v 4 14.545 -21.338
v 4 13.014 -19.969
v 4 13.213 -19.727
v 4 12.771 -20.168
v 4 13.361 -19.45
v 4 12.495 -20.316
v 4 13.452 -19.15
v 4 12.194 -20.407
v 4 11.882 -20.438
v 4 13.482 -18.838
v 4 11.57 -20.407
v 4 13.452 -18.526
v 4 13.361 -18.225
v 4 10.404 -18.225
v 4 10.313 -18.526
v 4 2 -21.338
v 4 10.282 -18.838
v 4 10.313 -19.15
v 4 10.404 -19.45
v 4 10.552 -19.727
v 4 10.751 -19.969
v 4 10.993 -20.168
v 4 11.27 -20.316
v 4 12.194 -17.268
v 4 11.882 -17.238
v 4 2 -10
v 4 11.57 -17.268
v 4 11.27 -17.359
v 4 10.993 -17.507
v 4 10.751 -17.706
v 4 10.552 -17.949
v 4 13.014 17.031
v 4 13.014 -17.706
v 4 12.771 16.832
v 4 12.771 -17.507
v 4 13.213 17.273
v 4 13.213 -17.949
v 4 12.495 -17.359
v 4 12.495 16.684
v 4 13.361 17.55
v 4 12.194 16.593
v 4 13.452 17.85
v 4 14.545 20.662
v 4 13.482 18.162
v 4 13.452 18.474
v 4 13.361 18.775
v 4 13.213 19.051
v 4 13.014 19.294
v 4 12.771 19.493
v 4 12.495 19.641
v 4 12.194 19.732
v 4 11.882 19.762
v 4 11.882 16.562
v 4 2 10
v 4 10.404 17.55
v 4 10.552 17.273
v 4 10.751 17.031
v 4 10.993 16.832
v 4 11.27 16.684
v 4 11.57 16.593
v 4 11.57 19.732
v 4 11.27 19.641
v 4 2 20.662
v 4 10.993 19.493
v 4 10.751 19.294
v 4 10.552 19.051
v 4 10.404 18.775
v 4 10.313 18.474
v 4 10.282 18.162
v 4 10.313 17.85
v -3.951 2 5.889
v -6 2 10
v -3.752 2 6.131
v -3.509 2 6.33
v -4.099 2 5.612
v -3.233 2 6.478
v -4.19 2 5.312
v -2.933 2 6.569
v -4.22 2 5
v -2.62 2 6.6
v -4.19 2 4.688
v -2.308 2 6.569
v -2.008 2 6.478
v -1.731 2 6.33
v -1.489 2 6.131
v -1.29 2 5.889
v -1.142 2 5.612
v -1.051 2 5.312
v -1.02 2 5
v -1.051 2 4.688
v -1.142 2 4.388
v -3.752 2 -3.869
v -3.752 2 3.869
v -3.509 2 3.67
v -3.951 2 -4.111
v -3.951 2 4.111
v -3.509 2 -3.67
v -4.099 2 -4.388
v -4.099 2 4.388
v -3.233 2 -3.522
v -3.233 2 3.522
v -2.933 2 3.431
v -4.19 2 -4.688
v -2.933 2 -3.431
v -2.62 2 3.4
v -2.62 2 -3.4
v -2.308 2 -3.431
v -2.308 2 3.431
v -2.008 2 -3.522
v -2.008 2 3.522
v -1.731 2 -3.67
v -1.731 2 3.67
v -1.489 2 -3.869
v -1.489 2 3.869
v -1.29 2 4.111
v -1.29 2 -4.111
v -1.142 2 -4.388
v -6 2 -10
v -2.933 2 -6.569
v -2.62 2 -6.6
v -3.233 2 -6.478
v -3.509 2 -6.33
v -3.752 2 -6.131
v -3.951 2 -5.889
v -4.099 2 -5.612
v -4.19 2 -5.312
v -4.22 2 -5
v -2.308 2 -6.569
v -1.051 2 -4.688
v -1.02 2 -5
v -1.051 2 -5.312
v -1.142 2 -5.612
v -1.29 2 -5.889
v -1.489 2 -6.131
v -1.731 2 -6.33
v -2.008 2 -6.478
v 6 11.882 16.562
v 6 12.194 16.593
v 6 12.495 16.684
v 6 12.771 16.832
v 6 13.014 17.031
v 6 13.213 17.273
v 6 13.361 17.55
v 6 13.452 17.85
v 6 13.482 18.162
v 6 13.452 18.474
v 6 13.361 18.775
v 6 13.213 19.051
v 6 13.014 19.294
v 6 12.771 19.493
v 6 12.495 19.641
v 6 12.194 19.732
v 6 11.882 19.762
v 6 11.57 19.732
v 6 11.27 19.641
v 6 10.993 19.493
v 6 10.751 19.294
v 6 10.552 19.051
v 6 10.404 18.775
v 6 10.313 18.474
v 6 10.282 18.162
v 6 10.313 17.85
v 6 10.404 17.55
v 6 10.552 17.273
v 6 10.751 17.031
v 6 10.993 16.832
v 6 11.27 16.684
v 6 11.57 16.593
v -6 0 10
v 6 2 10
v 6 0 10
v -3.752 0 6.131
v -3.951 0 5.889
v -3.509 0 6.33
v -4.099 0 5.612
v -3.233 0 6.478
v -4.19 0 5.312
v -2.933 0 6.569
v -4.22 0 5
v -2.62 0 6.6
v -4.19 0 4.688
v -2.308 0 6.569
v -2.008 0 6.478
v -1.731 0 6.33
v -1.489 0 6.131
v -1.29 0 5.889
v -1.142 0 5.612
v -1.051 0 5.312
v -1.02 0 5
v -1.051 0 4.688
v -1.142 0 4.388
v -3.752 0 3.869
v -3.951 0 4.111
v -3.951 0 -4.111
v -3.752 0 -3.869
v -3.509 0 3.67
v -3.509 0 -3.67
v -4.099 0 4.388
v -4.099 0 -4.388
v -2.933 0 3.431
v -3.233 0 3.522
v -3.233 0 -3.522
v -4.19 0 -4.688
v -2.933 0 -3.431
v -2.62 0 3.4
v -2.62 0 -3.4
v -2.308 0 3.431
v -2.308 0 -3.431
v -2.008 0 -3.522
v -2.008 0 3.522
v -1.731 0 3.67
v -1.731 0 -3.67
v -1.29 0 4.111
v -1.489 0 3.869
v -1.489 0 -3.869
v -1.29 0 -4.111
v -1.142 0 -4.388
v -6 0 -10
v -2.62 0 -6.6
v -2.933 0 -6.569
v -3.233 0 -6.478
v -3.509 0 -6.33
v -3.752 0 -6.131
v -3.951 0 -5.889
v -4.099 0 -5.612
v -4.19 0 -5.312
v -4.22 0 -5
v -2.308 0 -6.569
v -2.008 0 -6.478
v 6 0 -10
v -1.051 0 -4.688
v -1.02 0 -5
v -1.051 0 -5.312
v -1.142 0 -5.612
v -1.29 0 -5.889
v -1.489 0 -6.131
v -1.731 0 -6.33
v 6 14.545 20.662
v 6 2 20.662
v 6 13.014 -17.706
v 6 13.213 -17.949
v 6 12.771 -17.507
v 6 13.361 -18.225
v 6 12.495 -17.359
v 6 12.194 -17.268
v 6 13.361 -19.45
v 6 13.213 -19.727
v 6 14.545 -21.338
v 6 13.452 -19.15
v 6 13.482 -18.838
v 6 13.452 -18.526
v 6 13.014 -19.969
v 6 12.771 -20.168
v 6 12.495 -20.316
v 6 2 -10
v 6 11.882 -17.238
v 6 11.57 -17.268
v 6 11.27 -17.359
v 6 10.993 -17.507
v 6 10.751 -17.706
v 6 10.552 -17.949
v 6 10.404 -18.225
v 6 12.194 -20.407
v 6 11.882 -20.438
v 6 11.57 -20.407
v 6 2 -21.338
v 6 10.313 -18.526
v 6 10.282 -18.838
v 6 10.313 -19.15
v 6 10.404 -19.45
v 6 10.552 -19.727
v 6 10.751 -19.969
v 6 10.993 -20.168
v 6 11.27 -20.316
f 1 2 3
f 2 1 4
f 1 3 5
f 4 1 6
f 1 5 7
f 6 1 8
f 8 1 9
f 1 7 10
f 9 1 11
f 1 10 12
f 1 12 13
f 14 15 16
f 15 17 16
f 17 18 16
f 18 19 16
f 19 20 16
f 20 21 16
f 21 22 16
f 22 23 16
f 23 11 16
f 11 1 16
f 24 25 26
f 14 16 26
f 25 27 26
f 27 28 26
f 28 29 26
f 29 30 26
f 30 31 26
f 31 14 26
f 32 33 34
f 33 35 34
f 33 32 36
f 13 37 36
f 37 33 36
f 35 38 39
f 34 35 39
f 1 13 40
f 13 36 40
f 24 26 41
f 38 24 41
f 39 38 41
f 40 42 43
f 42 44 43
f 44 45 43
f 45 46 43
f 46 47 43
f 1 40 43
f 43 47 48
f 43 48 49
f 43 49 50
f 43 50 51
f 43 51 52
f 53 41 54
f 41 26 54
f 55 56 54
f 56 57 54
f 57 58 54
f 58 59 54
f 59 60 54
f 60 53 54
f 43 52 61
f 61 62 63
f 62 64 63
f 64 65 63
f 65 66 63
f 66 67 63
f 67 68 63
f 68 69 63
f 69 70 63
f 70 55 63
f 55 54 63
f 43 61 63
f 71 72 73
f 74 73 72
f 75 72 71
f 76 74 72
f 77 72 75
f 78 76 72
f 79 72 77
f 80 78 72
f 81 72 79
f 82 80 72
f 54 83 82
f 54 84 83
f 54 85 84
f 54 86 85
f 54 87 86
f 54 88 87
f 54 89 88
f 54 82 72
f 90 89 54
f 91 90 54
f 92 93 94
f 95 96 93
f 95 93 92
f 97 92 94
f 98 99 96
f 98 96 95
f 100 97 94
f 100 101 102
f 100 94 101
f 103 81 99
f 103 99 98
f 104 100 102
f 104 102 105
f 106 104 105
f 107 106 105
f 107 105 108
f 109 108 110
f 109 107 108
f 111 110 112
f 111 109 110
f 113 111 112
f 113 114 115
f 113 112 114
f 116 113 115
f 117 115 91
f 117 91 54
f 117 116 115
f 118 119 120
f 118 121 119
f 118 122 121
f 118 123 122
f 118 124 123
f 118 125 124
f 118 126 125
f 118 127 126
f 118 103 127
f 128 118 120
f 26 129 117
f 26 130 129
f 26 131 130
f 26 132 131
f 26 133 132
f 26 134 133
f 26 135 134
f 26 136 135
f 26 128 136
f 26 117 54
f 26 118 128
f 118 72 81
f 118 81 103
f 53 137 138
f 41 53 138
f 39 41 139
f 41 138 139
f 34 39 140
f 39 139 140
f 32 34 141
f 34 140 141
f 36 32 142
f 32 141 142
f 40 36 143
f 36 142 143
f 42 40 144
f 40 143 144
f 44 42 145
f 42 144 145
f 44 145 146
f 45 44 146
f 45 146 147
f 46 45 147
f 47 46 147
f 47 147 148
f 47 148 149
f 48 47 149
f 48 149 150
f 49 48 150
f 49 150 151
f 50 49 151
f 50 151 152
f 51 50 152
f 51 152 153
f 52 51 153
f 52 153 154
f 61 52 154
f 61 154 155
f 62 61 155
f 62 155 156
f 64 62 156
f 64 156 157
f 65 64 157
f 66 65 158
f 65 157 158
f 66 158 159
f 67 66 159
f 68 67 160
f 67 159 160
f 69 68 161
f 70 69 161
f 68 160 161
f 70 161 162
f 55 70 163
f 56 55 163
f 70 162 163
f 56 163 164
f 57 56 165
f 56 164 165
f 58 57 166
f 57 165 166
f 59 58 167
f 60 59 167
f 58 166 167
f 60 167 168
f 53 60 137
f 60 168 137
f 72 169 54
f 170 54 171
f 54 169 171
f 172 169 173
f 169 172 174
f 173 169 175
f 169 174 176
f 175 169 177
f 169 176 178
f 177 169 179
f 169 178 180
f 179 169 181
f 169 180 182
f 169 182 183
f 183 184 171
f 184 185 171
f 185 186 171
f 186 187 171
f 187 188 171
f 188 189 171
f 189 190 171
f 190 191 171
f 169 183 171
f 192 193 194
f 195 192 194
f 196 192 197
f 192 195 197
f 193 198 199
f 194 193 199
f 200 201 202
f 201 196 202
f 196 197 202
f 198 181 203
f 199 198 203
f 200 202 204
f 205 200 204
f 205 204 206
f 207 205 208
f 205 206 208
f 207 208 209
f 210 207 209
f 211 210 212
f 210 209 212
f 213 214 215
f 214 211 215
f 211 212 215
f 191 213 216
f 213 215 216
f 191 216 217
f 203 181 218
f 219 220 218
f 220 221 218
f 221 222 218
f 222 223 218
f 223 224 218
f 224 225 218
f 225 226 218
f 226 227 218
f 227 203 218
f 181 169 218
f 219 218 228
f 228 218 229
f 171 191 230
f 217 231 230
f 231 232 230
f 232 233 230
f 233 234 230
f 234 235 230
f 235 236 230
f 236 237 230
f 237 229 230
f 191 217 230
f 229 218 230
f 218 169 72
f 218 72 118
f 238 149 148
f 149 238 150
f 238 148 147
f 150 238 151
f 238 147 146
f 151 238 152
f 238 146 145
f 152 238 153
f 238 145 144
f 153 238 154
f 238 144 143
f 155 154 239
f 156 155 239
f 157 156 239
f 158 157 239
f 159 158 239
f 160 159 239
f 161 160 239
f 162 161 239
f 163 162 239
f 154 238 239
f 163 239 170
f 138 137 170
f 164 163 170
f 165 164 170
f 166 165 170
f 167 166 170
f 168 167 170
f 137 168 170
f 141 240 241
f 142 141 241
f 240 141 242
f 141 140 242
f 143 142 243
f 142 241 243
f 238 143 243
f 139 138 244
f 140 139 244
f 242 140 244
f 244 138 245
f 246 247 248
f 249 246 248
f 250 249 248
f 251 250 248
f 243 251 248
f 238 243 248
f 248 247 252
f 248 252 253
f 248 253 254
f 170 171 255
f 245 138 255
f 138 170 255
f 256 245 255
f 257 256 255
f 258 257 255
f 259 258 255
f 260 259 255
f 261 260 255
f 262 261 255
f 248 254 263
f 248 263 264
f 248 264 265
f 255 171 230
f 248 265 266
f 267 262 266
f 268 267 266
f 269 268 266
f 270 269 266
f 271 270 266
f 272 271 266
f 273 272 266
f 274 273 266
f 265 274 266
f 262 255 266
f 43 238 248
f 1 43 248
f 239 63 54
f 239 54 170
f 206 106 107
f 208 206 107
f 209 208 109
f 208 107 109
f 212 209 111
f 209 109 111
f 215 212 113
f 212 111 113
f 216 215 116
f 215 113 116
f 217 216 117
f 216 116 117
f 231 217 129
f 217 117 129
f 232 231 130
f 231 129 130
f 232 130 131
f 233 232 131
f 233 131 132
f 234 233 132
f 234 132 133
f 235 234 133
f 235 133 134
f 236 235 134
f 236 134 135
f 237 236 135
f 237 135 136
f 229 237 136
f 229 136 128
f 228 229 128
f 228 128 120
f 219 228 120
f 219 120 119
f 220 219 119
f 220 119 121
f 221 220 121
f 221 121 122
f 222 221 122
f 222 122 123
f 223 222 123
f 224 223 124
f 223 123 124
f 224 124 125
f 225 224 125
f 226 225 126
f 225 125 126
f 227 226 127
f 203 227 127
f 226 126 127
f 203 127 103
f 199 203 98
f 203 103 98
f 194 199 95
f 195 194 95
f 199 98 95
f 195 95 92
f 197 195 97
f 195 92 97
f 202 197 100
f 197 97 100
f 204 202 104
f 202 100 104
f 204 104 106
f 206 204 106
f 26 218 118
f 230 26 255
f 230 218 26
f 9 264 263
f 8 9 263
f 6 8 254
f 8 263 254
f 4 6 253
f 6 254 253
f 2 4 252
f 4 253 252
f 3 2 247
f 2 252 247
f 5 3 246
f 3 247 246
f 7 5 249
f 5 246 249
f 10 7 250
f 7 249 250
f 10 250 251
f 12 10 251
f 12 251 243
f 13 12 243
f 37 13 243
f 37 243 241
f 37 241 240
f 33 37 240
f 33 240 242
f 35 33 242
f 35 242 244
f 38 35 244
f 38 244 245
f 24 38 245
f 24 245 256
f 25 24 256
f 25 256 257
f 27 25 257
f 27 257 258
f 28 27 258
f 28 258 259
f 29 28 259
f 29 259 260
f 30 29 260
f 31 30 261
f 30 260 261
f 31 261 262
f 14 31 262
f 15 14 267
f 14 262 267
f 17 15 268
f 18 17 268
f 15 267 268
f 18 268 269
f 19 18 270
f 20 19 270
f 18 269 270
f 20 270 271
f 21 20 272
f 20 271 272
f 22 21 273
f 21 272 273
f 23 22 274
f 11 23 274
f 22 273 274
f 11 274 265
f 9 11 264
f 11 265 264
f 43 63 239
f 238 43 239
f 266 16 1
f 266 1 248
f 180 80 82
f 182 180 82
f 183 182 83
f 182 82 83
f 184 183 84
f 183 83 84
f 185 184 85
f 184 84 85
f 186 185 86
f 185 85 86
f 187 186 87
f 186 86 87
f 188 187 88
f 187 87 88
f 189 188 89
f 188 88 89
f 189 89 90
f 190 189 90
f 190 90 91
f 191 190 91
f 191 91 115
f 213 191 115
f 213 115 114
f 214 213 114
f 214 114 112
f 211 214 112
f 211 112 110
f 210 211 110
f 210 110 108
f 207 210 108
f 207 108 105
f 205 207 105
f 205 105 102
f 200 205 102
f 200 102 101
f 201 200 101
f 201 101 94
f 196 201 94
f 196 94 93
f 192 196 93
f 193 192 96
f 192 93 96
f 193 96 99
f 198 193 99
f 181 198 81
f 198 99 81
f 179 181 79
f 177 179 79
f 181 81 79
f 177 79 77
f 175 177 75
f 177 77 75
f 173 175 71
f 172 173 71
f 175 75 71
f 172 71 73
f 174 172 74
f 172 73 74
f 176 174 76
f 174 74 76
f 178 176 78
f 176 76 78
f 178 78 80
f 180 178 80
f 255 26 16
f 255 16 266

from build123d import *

# Parameters (mm, degrees)
SKETCH_1_W          = 12
SKETCH_1_H          = 20
EXTRUDE_1_DEPTH     = 2
SKETCH_2_W          = 2
SKETCH_2_H          = 11.337676179
SKETCH_2_H_2        = 20
SKETCH_2_H_3        = 10.662323821
EXTRUDE_3_DEPTH     = 20
SKETCH_5_R          = 1.6
SKETCH_5_W          = 42
SKETCH_5_H          = 7.454575948
CUT_EXTRUDE_1_DEPTH = 20
SKETCH_6_R          = 1.6
CUT_EXTRUDE_2_DEPTH = 10


with BuildPart() as part:
    # 草图1 → 凸台-拉伸1 (new body)
    with BuildSketch(Plane(origin=(0, 0, 0), x_dir=(1, 0, 0), z_dir=(0, 1, 0))):
        Rectangle(SKETCH_1_W, SKETCH_1_H)
    extrude(amount=EXTRUDE_1_DEPTH)

    # 草图2 → 凸台-拉伸3 (add)
    with BuildSketch(Plane(origin=(0, 2, 0), x_dir=(1, 0, 0), z_dir=(0, 1, 0))):
        with Locations((5, 15.66883809)):
            Rectangle(SKETCH_2_W, SKETCH_2_H)
        with Locations((5, 0)):
            Rectangle(SKETCH_2_W, SKETCH_2_H_2)
        with Locations((5, -15.331161911)):
            Rectangle(SKETCH_2_W, SKETCH_2_H_3)
    extrude(amount=EXTRUDE_3_DEPTH)

    # 草图5 → 切除-拉伸1 (cut)
    with BuildSketch(Plane(origin=(6, 0, 0), x_dir=(0, 0, -1), z_dir=(1, 0, 0))):
        with Locations((-18.162323821, 11.882323557)):
            Circle(SKETCH_5_R)
        with Locations((18.837676179, 11.882323557)):
            Circle(SKETCH_5_R)
        with Locations((0.337676179, 18.272712026)):
            Rectangle(SKETCH_5_W, SKETCH_5_H)
    extrude(amount=-CUT_EXTRUDE_1_DEPTH, mode=Mode.SUBTRACT)

    # 草图6 → 切除-拉伸2 (cut)
    with BuildSketch(Plane(origin=(0, 2, 0), x_dir=(1, 0, 0), z_dir=(0, 1, 0))):
        with Locations(Location((-2.620398145, 5, 0), (0, 0, 270))):
            Circle(SKETCH_6_R)
        with Locations(Location((-2.620398145, -5, 0), (0, 0, 270))):
            Circle(SKETCH_6_R)
    extrude(amount=-CUT_EXTRUDE_2_DEPTH, mode=Mode.SUBTRACT)


solid = part.part
